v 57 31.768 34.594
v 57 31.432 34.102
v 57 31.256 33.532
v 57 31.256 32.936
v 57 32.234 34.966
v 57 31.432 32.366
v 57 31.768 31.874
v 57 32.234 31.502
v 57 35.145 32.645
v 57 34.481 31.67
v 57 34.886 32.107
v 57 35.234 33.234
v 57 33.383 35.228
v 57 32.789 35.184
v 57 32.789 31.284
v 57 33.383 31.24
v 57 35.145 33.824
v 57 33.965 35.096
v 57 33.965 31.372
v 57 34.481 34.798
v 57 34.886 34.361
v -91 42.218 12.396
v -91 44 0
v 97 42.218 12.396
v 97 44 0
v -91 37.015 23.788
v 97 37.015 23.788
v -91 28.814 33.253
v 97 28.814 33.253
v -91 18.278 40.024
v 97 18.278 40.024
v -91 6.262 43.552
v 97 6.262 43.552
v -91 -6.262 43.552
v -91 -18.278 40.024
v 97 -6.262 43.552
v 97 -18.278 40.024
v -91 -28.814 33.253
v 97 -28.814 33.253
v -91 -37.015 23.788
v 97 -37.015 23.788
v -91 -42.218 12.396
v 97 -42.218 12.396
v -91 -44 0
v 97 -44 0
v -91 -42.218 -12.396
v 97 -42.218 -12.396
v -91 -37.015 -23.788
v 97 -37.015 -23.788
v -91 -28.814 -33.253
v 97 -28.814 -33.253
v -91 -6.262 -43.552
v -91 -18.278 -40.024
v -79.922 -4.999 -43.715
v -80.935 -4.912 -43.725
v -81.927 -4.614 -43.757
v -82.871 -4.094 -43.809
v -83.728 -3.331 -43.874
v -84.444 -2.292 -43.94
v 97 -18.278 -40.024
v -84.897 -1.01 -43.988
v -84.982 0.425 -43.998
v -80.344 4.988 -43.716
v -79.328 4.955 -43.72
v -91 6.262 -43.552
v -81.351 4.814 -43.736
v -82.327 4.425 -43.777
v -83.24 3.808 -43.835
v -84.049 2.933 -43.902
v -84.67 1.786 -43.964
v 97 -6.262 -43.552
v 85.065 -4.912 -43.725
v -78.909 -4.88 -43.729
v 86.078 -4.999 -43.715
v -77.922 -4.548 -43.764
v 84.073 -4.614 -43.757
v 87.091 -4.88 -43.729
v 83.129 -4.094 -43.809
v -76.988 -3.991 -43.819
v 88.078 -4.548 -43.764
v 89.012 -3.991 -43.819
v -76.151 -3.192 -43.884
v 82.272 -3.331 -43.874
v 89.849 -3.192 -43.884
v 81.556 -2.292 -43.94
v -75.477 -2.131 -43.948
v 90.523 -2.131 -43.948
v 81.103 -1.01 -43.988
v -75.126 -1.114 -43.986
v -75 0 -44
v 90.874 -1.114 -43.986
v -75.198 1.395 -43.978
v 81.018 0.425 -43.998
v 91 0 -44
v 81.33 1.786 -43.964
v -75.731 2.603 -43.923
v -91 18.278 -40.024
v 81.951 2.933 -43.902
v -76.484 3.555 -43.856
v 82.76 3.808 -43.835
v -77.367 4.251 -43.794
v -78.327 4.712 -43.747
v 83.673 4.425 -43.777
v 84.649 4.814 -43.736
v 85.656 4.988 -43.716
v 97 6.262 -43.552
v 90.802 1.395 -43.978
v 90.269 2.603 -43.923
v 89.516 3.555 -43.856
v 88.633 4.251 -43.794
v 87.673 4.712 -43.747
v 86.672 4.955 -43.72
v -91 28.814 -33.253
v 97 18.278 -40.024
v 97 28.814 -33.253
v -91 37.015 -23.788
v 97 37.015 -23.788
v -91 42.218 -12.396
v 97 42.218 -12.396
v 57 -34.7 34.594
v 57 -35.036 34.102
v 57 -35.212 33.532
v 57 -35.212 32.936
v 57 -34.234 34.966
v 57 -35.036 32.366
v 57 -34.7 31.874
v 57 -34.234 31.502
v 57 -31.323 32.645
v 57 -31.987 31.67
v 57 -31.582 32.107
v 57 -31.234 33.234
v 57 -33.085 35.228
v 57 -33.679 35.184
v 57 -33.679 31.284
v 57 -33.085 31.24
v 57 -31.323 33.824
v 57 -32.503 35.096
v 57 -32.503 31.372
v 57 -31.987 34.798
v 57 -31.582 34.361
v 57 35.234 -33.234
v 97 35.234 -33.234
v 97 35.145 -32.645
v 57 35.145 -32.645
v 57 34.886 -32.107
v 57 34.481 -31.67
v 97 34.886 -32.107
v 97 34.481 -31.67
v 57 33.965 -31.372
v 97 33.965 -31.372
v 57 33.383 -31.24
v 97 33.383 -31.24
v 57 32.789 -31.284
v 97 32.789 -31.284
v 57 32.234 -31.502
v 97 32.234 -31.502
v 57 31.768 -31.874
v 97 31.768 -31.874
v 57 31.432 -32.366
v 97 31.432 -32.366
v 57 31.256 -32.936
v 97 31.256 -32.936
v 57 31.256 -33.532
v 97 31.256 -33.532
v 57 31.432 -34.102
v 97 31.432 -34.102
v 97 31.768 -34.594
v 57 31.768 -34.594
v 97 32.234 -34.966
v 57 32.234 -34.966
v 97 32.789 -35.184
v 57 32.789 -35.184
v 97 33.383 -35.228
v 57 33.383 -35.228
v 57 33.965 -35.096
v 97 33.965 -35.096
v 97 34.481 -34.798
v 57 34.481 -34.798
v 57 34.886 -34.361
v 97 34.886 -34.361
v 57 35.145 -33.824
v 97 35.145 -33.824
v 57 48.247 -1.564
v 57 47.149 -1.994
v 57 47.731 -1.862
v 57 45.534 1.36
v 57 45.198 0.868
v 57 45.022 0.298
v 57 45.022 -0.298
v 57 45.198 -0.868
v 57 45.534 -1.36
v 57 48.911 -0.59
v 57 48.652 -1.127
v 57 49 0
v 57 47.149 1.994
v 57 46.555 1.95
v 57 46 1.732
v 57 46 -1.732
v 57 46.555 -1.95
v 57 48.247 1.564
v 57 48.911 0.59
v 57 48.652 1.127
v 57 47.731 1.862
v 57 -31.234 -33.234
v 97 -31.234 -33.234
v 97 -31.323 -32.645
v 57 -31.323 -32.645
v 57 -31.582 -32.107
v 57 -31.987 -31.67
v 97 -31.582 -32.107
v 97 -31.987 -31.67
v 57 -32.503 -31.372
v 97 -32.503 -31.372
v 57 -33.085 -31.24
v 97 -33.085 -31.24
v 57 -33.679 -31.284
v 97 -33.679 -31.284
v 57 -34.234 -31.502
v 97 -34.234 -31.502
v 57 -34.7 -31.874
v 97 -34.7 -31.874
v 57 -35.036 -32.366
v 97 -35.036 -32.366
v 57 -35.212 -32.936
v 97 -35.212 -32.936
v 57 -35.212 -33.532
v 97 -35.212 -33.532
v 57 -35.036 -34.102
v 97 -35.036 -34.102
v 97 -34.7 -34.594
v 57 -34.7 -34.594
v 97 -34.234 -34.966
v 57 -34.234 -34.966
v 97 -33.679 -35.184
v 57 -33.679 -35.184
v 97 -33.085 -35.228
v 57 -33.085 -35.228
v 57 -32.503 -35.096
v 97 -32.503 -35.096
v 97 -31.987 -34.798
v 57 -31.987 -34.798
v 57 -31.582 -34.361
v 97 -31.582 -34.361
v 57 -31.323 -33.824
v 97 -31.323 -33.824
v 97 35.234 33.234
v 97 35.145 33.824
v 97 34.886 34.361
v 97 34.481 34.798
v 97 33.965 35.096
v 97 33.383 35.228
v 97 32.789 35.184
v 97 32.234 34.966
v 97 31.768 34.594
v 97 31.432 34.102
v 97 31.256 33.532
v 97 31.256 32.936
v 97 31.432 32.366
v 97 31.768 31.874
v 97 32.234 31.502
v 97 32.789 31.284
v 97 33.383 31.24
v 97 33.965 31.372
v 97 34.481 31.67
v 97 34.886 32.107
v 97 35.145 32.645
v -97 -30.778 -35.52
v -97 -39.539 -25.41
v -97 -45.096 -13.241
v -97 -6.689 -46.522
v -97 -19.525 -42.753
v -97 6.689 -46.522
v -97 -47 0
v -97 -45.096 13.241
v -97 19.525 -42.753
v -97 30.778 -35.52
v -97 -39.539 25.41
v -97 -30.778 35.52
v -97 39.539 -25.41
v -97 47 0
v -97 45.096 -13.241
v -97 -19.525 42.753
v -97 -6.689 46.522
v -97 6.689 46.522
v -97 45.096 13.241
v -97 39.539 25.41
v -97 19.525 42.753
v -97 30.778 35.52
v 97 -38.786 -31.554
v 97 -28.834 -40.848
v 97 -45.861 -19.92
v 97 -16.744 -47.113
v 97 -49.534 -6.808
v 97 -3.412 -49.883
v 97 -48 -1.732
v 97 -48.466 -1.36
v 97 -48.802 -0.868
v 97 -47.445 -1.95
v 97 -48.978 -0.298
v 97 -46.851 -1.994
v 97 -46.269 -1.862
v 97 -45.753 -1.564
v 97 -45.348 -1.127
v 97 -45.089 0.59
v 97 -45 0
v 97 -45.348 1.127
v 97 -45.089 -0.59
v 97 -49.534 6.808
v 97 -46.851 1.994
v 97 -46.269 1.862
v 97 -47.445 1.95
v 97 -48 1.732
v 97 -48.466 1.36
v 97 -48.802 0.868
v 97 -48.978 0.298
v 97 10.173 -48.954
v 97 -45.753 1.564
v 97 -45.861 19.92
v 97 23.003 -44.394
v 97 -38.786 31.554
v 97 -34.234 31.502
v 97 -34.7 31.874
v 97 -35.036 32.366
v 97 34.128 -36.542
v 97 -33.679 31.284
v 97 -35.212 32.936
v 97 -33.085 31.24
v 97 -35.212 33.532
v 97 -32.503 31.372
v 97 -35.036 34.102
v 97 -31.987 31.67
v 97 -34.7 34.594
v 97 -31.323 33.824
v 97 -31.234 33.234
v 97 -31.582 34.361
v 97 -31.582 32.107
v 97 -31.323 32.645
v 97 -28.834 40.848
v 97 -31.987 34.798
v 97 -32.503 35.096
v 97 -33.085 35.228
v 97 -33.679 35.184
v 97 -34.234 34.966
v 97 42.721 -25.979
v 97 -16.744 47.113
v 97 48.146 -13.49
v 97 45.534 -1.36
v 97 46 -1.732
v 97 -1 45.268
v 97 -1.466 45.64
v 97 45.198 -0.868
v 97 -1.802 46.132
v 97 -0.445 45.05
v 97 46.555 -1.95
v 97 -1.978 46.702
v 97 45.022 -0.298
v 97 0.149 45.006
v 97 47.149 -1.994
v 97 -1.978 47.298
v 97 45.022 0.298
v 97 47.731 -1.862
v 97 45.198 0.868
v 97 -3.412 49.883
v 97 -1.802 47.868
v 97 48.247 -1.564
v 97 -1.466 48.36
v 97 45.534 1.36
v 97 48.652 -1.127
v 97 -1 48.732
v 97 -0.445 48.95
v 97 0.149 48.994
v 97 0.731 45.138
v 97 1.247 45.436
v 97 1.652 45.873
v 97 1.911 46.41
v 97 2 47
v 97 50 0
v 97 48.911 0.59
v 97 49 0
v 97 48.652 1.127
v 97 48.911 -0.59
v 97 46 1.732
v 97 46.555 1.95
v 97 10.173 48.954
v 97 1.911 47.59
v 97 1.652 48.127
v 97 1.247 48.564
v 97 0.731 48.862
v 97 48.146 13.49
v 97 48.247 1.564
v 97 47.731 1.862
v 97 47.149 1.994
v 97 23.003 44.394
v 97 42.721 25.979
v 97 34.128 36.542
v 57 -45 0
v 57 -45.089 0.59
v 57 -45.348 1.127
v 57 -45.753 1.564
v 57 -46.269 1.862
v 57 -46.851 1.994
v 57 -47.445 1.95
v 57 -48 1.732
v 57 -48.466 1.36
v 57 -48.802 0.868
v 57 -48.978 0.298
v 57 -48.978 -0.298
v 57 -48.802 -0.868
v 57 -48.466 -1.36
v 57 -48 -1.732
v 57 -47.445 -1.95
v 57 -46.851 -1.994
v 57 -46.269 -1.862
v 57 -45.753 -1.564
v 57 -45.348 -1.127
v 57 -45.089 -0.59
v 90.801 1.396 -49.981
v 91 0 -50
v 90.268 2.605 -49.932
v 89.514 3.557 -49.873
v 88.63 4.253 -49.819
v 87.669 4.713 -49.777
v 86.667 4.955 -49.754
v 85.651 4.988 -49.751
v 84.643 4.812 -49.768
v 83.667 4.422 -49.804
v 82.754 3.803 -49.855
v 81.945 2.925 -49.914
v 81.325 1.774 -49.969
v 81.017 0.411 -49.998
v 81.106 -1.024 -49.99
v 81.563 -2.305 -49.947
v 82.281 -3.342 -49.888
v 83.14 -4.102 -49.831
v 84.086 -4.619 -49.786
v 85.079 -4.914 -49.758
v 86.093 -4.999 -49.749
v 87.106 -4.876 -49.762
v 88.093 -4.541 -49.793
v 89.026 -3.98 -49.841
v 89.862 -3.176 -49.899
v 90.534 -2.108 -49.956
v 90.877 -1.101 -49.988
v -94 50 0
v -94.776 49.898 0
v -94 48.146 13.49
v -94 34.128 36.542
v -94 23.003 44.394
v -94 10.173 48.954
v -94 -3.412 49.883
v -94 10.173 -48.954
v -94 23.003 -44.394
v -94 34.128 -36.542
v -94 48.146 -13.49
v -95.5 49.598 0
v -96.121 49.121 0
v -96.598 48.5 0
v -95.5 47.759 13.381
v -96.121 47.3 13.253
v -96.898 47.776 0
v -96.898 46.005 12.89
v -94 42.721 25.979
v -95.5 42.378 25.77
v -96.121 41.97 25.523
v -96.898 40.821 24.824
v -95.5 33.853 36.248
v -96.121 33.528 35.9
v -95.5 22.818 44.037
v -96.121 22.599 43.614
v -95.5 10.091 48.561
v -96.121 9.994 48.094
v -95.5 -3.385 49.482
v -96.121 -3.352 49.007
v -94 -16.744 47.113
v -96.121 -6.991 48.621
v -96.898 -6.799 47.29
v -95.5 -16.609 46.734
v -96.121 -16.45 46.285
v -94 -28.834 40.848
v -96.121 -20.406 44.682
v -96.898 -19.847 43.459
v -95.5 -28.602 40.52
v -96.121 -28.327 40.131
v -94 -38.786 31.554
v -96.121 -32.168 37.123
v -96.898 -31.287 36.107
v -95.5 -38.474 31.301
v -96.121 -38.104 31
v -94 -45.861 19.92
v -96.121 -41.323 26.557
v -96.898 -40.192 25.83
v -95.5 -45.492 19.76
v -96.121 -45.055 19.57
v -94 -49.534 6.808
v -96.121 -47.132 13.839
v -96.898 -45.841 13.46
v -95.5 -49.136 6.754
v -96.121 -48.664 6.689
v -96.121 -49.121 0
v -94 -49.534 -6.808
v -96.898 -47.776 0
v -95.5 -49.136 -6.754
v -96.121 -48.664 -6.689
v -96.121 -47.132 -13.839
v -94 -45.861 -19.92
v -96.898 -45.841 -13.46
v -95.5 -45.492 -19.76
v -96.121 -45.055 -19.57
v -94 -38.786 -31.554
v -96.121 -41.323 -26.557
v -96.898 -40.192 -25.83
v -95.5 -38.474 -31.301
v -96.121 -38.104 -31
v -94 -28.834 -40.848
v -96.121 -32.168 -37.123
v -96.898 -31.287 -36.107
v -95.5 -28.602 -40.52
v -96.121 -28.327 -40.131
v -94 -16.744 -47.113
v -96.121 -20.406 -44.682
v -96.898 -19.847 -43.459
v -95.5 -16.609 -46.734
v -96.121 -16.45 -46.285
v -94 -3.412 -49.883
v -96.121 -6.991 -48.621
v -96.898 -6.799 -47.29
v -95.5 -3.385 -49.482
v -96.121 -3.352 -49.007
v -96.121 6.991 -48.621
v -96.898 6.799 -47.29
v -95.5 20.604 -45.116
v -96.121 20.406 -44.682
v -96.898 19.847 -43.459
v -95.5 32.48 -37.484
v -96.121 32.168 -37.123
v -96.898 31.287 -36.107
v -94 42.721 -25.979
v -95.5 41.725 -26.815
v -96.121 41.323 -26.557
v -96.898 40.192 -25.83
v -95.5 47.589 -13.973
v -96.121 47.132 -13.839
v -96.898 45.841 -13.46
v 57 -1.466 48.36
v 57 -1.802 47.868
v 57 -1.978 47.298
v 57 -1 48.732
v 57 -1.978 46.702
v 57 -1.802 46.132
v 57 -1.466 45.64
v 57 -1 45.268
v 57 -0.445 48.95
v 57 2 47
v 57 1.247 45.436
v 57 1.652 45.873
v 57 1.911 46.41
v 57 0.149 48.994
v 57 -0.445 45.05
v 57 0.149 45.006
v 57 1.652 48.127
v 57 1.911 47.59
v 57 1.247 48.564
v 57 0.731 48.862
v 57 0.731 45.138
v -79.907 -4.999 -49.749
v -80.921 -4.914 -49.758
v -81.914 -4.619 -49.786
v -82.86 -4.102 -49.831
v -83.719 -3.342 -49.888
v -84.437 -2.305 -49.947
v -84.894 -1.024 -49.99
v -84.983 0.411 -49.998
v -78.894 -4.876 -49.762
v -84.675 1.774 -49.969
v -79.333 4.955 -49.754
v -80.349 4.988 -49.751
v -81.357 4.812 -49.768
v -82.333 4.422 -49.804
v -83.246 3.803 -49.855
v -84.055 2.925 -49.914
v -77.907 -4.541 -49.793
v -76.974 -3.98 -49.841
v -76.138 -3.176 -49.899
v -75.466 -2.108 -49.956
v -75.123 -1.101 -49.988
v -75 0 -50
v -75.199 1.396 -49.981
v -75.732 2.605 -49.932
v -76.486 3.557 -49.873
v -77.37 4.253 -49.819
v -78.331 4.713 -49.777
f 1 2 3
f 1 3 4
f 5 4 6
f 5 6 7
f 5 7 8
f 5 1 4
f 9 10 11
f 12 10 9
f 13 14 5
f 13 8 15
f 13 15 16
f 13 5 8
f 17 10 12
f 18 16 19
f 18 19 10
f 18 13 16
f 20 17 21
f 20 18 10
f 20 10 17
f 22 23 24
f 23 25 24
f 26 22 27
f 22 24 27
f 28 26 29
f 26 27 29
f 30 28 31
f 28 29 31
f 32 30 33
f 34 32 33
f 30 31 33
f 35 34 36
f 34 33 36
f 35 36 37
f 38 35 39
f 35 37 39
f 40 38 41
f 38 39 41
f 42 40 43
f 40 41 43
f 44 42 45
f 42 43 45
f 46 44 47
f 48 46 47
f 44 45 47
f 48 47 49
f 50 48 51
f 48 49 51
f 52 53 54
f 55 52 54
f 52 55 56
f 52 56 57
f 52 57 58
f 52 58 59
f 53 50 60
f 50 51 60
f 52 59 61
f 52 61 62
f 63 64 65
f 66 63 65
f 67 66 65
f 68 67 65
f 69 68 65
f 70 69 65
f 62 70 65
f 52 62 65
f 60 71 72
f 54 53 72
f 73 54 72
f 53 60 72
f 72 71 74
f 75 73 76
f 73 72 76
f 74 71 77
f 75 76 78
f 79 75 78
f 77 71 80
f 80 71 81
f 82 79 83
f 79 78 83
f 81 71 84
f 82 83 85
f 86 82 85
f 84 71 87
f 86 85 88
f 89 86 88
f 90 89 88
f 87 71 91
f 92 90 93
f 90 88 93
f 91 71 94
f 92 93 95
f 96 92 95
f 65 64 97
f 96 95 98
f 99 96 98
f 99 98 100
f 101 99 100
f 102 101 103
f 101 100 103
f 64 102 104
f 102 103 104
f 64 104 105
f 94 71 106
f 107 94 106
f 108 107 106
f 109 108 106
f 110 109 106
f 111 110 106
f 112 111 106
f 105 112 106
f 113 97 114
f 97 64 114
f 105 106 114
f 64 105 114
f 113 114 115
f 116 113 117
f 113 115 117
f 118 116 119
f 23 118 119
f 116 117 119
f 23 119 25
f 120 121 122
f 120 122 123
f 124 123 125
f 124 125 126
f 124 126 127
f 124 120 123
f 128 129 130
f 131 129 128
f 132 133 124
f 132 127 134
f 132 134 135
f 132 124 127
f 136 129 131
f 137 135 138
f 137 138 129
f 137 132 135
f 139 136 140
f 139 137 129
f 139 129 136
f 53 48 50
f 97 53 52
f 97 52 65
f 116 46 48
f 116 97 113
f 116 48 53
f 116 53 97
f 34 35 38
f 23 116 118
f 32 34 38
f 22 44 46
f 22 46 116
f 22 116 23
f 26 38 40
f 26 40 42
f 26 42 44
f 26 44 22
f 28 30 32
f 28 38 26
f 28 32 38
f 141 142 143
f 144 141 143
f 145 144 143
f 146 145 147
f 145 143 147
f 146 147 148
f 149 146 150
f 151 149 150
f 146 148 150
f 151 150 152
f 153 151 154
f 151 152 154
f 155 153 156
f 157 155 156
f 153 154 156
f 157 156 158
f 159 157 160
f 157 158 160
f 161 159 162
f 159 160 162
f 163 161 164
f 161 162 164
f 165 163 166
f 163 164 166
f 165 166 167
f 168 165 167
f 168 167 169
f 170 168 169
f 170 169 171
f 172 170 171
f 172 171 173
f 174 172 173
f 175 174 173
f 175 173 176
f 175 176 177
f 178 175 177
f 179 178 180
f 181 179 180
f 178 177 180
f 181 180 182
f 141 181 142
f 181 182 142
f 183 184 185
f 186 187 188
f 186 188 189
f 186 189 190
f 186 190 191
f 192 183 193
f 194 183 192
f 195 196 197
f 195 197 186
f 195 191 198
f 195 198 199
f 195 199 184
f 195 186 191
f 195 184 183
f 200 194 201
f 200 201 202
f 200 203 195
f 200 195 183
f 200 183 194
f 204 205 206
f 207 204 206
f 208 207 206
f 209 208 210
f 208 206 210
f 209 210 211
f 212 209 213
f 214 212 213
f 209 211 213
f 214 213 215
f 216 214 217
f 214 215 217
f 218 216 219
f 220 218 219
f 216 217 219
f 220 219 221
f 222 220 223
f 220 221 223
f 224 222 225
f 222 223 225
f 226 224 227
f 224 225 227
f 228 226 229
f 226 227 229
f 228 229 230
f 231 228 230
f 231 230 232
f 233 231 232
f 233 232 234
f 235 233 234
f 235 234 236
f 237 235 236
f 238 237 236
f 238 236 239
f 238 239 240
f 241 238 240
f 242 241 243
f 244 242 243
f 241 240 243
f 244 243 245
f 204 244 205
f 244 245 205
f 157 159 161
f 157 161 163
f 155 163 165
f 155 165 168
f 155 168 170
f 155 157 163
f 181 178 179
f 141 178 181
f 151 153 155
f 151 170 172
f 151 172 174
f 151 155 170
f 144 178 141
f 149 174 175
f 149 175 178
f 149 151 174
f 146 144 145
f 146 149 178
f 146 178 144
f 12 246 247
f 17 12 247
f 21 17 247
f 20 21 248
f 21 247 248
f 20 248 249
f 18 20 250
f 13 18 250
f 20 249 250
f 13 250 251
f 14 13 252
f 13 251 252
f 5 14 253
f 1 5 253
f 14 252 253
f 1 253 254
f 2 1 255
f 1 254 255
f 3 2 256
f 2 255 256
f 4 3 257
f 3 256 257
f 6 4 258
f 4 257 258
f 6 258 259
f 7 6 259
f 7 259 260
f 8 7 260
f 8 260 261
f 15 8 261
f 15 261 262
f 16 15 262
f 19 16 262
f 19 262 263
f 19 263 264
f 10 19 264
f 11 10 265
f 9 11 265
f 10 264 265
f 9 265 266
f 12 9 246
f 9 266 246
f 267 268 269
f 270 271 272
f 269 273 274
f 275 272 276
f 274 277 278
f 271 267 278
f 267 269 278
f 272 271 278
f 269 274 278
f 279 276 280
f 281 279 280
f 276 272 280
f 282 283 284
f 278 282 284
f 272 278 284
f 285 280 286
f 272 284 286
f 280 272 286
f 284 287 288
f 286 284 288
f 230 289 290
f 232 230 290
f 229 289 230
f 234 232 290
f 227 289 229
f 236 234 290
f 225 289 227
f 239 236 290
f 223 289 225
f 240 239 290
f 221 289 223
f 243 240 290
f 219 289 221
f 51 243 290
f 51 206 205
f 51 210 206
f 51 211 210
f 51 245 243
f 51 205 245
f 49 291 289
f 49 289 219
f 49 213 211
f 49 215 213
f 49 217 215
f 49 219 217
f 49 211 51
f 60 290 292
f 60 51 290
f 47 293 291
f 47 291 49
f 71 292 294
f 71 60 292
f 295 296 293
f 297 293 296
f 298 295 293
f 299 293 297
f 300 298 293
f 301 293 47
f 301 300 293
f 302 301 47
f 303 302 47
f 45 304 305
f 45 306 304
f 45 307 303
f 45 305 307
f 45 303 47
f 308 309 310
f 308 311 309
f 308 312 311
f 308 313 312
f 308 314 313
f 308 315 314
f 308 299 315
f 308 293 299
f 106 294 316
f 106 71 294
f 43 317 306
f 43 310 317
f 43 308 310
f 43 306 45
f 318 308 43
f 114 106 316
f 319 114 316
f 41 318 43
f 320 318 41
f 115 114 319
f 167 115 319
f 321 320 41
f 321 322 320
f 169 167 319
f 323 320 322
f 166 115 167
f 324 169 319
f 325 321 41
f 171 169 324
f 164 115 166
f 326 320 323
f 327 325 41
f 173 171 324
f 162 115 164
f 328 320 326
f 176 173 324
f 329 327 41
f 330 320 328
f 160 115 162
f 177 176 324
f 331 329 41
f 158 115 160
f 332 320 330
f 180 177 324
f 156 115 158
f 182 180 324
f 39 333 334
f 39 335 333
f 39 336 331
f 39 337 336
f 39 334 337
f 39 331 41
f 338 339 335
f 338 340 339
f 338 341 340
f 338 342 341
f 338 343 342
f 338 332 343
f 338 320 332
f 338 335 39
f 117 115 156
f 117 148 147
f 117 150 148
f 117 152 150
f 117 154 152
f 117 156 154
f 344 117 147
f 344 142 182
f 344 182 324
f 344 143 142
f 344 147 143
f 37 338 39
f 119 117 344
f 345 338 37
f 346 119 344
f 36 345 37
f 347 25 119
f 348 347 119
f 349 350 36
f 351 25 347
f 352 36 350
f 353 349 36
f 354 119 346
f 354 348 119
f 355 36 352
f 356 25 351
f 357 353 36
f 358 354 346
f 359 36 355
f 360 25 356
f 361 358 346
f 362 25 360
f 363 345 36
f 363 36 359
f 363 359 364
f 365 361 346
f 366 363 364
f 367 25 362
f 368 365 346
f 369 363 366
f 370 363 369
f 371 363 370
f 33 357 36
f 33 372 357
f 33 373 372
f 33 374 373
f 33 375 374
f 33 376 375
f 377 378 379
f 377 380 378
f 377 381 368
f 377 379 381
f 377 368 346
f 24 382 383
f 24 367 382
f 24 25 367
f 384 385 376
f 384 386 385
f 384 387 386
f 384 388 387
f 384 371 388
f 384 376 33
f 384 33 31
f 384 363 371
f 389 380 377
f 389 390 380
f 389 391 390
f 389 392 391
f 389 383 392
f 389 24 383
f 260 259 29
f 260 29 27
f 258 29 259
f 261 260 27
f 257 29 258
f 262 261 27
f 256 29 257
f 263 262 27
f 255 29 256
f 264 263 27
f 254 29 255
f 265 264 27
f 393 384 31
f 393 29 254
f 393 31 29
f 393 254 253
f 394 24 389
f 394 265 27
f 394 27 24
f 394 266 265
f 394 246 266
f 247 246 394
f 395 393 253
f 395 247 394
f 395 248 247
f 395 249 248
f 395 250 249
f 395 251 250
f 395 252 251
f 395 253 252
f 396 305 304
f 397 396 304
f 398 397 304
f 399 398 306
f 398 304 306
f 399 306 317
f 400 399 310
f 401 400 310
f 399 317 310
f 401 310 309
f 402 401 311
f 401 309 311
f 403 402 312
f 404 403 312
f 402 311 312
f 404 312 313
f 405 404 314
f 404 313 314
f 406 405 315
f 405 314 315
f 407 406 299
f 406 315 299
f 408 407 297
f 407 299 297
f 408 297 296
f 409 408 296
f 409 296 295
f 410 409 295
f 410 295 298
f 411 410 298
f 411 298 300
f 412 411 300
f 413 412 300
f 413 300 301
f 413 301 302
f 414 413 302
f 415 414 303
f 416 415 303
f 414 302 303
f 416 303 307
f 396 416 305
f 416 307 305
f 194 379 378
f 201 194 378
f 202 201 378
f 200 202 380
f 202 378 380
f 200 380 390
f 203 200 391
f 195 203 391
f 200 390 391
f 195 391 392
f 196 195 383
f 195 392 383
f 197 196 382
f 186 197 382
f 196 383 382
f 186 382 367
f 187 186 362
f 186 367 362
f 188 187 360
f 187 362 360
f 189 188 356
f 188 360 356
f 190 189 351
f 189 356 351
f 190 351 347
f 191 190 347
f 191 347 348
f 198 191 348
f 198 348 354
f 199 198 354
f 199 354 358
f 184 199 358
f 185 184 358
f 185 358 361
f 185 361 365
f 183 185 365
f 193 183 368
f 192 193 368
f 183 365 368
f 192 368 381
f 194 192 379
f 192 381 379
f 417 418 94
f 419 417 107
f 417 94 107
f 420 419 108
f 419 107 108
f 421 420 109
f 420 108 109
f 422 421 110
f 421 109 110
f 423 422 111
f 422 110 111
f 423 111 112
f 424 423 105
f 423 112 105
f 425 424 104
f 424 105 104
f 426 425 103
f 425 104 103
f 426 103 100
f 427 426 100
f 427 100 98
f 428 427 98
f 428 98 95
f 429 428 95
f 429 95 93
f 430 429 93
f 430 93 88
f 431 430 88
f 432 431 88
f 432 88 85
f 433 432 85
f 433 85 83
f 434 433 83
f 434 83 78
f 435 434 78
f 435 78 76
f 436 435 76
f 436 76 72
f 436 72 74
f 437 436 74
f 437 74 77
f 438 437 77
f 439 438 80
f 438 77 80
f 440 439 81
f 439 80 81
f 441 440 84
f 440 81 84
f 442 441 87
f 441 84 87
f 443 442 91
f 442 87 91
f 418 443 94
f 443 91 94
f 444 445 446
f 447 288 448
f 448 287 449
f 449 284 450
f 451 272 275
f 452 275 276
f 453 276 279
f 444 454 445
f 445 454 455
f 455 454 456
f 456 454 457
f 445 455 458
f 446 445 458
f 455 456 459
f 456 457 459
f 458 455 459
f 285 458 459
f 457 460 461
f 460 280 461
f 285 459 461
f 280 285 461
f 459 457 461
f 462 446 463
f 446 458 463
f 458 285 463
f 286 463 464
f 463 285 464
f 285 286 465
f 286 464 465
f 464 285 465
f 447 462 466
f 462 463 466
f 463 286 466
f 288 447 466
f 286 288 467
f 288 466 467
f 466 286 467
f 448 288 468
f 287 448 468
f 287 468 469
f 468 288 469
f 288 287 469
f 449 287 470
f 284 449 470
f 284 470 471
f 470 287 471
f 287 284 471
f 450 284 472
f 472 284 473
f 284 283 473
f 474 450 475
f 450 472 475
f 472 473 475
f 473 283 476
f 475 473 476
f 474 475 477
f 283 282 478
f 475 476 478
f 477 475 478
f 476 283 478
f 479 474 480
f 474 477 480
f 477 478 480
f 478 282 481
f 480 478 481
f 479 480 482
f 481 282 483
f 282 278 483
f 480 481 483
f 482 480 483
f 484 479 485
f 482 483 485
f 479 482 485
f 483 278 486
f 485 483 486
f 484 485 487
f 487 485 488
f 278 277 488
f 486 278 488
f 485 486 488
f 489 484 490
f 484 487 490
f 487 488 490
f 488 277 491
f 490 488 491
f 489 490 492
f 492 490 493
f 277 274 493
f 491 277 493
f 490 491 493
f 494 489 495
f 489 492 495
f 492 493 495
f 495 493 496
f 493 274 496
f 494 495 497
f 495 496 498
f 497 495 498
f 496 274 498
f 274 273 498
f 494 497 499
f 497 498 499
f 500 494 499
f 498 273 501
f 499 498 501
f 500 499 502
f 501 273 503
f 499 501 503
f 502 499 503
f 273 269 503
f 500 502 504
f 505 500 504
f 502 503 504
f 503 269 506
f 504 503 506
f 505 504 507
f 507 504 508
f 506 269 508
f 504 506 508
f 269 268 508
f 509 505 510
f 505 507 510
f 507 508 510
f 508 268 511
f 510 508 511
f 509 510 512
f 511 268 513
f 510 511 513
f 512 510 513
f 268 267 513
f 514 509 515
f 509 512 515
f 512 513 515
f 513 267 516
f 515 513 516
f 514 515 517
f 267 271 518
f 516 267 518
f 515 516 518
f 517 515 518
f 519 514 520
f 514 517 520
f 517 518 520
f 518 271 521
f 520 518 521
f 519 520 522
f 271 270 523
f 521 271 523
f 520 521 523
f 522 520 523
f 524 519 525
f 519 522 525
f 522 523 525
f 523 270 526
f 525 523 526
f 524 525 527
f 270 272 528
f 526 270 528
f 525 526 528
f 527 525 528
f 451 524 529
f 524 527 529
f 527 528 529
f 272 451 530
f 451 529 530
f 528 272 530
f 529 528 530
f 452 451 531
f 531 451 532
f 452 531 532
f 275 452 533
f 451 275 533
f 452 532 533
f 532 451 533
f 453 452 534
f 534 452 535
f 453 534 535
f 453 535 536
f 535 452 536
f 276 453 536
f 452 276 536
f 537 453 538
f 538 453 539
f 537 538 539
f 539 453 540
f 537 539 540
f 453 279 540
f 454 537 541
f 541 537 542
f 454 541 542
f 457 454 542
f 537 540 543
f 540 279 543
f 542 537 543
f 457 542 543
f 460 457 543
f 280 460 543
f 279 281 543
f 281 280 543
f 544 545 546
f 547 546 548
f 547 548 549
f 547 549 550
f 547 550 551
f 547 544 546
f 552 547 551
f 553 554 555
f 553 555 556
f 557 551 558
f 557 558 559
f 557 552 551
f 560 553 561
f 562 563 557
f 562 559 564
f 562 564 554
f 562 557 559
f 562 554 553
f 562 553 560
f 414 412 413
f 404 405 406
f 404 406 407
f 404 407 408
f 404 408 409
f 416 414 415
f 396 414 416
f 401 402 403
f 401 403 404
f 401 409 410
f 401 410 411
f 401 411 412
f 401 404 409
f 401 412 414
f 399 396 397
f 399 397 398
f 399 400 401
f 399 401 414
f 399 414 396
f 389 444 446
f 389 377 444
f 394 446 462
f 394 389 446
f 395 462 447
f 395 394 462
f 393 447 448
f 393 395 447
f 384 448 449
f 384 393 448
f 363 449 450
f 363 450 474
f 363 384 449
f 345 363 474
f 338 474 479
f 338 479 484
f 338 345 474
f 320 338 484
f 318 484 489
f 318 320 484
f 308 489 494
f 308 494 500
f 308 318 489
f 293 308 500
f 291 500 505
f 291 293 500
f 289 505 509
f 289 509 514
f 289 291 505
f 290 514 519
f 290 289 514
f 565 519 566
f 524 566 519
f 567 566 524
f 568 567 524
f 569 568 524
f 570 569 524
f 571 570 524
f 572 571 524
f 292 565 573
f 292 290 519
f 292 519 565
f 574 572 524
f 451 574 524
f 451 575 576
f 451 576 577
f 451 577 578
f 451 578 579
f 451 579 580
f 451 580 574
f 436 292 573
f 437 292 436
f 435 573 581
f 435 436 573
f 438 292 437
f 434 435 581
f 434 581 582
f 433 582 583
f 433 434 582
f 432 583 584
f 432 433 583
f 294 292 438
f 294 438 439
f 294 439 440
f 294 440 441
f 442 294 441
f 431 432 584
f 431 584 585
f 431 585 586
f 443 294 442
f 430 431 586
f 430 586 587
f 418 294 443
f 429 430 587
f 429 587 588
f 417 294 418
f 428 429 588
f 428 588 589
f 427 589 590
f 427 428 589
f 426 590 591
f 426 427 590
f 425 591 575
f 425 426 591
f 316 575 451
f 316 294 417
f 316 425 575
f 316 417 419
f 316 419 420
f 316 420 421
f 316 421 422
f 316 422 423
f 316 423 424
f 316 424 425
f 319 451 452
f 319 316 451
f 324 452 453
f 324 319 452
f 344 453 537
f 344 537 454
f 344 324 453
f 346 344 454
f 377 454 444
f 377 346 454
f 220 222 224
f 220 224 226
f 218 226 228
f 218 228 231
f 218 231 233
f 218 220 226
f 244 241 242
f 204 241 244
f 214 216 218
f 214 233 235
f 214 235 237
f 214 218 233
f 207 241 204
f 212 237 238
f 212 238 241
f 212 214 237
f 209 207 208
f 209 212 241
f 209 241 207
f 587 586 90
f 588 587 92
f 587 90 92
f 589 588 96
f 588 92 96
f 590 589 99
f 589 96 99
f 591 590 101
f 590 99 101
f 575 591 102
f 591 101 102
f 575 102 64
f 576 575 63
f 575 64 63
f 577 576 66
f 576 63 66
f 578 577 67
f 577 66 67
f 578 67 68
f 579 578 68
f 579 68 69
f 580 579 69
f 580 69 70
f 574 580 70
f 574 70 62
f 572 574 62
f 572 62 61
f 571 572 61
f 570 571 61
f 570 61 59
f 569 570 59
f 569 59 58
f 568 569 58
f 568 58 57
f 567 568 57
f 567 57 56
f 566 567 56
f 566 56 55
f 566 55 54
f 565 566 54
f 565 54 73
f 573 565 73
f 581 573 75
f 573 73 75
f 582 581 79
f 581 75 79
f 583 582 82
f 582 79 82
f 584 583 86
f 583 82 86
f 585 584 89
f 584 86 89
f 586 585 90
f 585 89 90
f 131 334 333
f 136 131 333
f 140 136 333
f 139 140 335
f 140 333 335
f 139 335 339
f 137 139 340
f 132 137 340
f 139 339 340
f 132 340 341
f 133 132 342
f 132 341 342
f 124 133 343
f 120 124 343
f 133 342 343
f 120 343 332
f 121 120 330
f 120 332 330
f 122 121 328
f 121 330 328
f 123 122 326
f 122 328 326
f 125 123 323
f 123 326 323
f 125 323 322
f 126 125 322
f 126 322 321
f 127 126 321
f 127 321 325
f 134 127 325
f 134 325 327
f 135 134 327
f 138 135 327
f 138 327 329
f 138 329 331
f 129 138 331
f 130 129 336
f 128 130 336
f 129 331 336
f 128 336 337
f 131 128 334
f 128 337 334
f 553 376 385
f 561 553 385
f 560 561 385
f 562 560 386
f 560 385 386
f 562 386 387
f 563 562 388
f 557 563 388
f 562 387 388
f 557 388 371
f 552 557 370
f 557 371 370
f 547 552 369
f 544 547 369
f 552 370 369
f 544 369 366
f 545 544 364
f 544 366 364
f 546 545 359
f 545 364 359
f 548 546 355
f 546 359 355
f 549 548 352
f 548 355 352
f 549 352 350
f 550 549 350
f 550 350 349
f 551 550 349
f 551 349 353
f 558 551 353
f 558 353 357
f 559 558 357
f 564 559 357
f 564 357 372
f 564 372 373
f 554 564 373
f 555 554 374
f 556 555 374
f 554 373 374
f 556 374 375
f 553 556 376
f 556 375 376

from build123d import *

# Parameters (mm, degrees)
F0_R     = 50
F1_DEPTH = 97
F2_T     = -6
F3_R     = 2
F4_DEPTH = 40
F5_R     = 3
F6_R     = 5
F7_DEPTH = 50.001


with BuildPart() as f1:
    # F0 (on Right) → F1 (new body, symmetric)
    with BuildSketch(Plane.YZ):
        Circle(F0_R)
    extrude(amount=F1_DEPTH, both=True)

    # F2
    f2_openings = [f1.faces().sort_by_distance(p)[0] for p in [
        (97, 0, 0),
    ]]
    offset(amount=F2_T, openings=f2_openings)

    # F3 (on face) → F4 (cut)
    with BuildSketch(Plane.YZ.offset(97)):
        with Locations((-47, 0)):
            Circle(F3_R)
        with Locations((-33.234019, 33.234019)):
            Circle(F3_R)
        with Locations((0, 47)):
            Circle(F3_R)
        with Locations((33.234019, 33.234019)):
            Circle(F3_R)
        with Locations((47, 0)):
            Circle(F3_R)
        with Locations((-33.234019, -33.234019)):
            Circle(F3_R)
        with Locations((33.234019, -33.234019)):
            Circle(F3_R)
    extrude(amount=-F4_DEPTH, mode=Mode.SUBTRACT)

    # F5
    f5_edges = [f1.edges().sort_by_distance(p)[0] for p in [
        (-97, -50, 0),
    ]]
    fillet(f5_edges, radius=F5_R)

    # F6 (on Top) → F7 (cut, through all)
    with BuildSketch(Plane.XY):
        with Locations((-80, 0)):
            Circle(F6_R)
        with Locations((86, 0)):
            Circle(F6_R)
    extrude(amount=-F7_DEPTH, mode=Mode.SUBTRACT)


solid = f1.part
